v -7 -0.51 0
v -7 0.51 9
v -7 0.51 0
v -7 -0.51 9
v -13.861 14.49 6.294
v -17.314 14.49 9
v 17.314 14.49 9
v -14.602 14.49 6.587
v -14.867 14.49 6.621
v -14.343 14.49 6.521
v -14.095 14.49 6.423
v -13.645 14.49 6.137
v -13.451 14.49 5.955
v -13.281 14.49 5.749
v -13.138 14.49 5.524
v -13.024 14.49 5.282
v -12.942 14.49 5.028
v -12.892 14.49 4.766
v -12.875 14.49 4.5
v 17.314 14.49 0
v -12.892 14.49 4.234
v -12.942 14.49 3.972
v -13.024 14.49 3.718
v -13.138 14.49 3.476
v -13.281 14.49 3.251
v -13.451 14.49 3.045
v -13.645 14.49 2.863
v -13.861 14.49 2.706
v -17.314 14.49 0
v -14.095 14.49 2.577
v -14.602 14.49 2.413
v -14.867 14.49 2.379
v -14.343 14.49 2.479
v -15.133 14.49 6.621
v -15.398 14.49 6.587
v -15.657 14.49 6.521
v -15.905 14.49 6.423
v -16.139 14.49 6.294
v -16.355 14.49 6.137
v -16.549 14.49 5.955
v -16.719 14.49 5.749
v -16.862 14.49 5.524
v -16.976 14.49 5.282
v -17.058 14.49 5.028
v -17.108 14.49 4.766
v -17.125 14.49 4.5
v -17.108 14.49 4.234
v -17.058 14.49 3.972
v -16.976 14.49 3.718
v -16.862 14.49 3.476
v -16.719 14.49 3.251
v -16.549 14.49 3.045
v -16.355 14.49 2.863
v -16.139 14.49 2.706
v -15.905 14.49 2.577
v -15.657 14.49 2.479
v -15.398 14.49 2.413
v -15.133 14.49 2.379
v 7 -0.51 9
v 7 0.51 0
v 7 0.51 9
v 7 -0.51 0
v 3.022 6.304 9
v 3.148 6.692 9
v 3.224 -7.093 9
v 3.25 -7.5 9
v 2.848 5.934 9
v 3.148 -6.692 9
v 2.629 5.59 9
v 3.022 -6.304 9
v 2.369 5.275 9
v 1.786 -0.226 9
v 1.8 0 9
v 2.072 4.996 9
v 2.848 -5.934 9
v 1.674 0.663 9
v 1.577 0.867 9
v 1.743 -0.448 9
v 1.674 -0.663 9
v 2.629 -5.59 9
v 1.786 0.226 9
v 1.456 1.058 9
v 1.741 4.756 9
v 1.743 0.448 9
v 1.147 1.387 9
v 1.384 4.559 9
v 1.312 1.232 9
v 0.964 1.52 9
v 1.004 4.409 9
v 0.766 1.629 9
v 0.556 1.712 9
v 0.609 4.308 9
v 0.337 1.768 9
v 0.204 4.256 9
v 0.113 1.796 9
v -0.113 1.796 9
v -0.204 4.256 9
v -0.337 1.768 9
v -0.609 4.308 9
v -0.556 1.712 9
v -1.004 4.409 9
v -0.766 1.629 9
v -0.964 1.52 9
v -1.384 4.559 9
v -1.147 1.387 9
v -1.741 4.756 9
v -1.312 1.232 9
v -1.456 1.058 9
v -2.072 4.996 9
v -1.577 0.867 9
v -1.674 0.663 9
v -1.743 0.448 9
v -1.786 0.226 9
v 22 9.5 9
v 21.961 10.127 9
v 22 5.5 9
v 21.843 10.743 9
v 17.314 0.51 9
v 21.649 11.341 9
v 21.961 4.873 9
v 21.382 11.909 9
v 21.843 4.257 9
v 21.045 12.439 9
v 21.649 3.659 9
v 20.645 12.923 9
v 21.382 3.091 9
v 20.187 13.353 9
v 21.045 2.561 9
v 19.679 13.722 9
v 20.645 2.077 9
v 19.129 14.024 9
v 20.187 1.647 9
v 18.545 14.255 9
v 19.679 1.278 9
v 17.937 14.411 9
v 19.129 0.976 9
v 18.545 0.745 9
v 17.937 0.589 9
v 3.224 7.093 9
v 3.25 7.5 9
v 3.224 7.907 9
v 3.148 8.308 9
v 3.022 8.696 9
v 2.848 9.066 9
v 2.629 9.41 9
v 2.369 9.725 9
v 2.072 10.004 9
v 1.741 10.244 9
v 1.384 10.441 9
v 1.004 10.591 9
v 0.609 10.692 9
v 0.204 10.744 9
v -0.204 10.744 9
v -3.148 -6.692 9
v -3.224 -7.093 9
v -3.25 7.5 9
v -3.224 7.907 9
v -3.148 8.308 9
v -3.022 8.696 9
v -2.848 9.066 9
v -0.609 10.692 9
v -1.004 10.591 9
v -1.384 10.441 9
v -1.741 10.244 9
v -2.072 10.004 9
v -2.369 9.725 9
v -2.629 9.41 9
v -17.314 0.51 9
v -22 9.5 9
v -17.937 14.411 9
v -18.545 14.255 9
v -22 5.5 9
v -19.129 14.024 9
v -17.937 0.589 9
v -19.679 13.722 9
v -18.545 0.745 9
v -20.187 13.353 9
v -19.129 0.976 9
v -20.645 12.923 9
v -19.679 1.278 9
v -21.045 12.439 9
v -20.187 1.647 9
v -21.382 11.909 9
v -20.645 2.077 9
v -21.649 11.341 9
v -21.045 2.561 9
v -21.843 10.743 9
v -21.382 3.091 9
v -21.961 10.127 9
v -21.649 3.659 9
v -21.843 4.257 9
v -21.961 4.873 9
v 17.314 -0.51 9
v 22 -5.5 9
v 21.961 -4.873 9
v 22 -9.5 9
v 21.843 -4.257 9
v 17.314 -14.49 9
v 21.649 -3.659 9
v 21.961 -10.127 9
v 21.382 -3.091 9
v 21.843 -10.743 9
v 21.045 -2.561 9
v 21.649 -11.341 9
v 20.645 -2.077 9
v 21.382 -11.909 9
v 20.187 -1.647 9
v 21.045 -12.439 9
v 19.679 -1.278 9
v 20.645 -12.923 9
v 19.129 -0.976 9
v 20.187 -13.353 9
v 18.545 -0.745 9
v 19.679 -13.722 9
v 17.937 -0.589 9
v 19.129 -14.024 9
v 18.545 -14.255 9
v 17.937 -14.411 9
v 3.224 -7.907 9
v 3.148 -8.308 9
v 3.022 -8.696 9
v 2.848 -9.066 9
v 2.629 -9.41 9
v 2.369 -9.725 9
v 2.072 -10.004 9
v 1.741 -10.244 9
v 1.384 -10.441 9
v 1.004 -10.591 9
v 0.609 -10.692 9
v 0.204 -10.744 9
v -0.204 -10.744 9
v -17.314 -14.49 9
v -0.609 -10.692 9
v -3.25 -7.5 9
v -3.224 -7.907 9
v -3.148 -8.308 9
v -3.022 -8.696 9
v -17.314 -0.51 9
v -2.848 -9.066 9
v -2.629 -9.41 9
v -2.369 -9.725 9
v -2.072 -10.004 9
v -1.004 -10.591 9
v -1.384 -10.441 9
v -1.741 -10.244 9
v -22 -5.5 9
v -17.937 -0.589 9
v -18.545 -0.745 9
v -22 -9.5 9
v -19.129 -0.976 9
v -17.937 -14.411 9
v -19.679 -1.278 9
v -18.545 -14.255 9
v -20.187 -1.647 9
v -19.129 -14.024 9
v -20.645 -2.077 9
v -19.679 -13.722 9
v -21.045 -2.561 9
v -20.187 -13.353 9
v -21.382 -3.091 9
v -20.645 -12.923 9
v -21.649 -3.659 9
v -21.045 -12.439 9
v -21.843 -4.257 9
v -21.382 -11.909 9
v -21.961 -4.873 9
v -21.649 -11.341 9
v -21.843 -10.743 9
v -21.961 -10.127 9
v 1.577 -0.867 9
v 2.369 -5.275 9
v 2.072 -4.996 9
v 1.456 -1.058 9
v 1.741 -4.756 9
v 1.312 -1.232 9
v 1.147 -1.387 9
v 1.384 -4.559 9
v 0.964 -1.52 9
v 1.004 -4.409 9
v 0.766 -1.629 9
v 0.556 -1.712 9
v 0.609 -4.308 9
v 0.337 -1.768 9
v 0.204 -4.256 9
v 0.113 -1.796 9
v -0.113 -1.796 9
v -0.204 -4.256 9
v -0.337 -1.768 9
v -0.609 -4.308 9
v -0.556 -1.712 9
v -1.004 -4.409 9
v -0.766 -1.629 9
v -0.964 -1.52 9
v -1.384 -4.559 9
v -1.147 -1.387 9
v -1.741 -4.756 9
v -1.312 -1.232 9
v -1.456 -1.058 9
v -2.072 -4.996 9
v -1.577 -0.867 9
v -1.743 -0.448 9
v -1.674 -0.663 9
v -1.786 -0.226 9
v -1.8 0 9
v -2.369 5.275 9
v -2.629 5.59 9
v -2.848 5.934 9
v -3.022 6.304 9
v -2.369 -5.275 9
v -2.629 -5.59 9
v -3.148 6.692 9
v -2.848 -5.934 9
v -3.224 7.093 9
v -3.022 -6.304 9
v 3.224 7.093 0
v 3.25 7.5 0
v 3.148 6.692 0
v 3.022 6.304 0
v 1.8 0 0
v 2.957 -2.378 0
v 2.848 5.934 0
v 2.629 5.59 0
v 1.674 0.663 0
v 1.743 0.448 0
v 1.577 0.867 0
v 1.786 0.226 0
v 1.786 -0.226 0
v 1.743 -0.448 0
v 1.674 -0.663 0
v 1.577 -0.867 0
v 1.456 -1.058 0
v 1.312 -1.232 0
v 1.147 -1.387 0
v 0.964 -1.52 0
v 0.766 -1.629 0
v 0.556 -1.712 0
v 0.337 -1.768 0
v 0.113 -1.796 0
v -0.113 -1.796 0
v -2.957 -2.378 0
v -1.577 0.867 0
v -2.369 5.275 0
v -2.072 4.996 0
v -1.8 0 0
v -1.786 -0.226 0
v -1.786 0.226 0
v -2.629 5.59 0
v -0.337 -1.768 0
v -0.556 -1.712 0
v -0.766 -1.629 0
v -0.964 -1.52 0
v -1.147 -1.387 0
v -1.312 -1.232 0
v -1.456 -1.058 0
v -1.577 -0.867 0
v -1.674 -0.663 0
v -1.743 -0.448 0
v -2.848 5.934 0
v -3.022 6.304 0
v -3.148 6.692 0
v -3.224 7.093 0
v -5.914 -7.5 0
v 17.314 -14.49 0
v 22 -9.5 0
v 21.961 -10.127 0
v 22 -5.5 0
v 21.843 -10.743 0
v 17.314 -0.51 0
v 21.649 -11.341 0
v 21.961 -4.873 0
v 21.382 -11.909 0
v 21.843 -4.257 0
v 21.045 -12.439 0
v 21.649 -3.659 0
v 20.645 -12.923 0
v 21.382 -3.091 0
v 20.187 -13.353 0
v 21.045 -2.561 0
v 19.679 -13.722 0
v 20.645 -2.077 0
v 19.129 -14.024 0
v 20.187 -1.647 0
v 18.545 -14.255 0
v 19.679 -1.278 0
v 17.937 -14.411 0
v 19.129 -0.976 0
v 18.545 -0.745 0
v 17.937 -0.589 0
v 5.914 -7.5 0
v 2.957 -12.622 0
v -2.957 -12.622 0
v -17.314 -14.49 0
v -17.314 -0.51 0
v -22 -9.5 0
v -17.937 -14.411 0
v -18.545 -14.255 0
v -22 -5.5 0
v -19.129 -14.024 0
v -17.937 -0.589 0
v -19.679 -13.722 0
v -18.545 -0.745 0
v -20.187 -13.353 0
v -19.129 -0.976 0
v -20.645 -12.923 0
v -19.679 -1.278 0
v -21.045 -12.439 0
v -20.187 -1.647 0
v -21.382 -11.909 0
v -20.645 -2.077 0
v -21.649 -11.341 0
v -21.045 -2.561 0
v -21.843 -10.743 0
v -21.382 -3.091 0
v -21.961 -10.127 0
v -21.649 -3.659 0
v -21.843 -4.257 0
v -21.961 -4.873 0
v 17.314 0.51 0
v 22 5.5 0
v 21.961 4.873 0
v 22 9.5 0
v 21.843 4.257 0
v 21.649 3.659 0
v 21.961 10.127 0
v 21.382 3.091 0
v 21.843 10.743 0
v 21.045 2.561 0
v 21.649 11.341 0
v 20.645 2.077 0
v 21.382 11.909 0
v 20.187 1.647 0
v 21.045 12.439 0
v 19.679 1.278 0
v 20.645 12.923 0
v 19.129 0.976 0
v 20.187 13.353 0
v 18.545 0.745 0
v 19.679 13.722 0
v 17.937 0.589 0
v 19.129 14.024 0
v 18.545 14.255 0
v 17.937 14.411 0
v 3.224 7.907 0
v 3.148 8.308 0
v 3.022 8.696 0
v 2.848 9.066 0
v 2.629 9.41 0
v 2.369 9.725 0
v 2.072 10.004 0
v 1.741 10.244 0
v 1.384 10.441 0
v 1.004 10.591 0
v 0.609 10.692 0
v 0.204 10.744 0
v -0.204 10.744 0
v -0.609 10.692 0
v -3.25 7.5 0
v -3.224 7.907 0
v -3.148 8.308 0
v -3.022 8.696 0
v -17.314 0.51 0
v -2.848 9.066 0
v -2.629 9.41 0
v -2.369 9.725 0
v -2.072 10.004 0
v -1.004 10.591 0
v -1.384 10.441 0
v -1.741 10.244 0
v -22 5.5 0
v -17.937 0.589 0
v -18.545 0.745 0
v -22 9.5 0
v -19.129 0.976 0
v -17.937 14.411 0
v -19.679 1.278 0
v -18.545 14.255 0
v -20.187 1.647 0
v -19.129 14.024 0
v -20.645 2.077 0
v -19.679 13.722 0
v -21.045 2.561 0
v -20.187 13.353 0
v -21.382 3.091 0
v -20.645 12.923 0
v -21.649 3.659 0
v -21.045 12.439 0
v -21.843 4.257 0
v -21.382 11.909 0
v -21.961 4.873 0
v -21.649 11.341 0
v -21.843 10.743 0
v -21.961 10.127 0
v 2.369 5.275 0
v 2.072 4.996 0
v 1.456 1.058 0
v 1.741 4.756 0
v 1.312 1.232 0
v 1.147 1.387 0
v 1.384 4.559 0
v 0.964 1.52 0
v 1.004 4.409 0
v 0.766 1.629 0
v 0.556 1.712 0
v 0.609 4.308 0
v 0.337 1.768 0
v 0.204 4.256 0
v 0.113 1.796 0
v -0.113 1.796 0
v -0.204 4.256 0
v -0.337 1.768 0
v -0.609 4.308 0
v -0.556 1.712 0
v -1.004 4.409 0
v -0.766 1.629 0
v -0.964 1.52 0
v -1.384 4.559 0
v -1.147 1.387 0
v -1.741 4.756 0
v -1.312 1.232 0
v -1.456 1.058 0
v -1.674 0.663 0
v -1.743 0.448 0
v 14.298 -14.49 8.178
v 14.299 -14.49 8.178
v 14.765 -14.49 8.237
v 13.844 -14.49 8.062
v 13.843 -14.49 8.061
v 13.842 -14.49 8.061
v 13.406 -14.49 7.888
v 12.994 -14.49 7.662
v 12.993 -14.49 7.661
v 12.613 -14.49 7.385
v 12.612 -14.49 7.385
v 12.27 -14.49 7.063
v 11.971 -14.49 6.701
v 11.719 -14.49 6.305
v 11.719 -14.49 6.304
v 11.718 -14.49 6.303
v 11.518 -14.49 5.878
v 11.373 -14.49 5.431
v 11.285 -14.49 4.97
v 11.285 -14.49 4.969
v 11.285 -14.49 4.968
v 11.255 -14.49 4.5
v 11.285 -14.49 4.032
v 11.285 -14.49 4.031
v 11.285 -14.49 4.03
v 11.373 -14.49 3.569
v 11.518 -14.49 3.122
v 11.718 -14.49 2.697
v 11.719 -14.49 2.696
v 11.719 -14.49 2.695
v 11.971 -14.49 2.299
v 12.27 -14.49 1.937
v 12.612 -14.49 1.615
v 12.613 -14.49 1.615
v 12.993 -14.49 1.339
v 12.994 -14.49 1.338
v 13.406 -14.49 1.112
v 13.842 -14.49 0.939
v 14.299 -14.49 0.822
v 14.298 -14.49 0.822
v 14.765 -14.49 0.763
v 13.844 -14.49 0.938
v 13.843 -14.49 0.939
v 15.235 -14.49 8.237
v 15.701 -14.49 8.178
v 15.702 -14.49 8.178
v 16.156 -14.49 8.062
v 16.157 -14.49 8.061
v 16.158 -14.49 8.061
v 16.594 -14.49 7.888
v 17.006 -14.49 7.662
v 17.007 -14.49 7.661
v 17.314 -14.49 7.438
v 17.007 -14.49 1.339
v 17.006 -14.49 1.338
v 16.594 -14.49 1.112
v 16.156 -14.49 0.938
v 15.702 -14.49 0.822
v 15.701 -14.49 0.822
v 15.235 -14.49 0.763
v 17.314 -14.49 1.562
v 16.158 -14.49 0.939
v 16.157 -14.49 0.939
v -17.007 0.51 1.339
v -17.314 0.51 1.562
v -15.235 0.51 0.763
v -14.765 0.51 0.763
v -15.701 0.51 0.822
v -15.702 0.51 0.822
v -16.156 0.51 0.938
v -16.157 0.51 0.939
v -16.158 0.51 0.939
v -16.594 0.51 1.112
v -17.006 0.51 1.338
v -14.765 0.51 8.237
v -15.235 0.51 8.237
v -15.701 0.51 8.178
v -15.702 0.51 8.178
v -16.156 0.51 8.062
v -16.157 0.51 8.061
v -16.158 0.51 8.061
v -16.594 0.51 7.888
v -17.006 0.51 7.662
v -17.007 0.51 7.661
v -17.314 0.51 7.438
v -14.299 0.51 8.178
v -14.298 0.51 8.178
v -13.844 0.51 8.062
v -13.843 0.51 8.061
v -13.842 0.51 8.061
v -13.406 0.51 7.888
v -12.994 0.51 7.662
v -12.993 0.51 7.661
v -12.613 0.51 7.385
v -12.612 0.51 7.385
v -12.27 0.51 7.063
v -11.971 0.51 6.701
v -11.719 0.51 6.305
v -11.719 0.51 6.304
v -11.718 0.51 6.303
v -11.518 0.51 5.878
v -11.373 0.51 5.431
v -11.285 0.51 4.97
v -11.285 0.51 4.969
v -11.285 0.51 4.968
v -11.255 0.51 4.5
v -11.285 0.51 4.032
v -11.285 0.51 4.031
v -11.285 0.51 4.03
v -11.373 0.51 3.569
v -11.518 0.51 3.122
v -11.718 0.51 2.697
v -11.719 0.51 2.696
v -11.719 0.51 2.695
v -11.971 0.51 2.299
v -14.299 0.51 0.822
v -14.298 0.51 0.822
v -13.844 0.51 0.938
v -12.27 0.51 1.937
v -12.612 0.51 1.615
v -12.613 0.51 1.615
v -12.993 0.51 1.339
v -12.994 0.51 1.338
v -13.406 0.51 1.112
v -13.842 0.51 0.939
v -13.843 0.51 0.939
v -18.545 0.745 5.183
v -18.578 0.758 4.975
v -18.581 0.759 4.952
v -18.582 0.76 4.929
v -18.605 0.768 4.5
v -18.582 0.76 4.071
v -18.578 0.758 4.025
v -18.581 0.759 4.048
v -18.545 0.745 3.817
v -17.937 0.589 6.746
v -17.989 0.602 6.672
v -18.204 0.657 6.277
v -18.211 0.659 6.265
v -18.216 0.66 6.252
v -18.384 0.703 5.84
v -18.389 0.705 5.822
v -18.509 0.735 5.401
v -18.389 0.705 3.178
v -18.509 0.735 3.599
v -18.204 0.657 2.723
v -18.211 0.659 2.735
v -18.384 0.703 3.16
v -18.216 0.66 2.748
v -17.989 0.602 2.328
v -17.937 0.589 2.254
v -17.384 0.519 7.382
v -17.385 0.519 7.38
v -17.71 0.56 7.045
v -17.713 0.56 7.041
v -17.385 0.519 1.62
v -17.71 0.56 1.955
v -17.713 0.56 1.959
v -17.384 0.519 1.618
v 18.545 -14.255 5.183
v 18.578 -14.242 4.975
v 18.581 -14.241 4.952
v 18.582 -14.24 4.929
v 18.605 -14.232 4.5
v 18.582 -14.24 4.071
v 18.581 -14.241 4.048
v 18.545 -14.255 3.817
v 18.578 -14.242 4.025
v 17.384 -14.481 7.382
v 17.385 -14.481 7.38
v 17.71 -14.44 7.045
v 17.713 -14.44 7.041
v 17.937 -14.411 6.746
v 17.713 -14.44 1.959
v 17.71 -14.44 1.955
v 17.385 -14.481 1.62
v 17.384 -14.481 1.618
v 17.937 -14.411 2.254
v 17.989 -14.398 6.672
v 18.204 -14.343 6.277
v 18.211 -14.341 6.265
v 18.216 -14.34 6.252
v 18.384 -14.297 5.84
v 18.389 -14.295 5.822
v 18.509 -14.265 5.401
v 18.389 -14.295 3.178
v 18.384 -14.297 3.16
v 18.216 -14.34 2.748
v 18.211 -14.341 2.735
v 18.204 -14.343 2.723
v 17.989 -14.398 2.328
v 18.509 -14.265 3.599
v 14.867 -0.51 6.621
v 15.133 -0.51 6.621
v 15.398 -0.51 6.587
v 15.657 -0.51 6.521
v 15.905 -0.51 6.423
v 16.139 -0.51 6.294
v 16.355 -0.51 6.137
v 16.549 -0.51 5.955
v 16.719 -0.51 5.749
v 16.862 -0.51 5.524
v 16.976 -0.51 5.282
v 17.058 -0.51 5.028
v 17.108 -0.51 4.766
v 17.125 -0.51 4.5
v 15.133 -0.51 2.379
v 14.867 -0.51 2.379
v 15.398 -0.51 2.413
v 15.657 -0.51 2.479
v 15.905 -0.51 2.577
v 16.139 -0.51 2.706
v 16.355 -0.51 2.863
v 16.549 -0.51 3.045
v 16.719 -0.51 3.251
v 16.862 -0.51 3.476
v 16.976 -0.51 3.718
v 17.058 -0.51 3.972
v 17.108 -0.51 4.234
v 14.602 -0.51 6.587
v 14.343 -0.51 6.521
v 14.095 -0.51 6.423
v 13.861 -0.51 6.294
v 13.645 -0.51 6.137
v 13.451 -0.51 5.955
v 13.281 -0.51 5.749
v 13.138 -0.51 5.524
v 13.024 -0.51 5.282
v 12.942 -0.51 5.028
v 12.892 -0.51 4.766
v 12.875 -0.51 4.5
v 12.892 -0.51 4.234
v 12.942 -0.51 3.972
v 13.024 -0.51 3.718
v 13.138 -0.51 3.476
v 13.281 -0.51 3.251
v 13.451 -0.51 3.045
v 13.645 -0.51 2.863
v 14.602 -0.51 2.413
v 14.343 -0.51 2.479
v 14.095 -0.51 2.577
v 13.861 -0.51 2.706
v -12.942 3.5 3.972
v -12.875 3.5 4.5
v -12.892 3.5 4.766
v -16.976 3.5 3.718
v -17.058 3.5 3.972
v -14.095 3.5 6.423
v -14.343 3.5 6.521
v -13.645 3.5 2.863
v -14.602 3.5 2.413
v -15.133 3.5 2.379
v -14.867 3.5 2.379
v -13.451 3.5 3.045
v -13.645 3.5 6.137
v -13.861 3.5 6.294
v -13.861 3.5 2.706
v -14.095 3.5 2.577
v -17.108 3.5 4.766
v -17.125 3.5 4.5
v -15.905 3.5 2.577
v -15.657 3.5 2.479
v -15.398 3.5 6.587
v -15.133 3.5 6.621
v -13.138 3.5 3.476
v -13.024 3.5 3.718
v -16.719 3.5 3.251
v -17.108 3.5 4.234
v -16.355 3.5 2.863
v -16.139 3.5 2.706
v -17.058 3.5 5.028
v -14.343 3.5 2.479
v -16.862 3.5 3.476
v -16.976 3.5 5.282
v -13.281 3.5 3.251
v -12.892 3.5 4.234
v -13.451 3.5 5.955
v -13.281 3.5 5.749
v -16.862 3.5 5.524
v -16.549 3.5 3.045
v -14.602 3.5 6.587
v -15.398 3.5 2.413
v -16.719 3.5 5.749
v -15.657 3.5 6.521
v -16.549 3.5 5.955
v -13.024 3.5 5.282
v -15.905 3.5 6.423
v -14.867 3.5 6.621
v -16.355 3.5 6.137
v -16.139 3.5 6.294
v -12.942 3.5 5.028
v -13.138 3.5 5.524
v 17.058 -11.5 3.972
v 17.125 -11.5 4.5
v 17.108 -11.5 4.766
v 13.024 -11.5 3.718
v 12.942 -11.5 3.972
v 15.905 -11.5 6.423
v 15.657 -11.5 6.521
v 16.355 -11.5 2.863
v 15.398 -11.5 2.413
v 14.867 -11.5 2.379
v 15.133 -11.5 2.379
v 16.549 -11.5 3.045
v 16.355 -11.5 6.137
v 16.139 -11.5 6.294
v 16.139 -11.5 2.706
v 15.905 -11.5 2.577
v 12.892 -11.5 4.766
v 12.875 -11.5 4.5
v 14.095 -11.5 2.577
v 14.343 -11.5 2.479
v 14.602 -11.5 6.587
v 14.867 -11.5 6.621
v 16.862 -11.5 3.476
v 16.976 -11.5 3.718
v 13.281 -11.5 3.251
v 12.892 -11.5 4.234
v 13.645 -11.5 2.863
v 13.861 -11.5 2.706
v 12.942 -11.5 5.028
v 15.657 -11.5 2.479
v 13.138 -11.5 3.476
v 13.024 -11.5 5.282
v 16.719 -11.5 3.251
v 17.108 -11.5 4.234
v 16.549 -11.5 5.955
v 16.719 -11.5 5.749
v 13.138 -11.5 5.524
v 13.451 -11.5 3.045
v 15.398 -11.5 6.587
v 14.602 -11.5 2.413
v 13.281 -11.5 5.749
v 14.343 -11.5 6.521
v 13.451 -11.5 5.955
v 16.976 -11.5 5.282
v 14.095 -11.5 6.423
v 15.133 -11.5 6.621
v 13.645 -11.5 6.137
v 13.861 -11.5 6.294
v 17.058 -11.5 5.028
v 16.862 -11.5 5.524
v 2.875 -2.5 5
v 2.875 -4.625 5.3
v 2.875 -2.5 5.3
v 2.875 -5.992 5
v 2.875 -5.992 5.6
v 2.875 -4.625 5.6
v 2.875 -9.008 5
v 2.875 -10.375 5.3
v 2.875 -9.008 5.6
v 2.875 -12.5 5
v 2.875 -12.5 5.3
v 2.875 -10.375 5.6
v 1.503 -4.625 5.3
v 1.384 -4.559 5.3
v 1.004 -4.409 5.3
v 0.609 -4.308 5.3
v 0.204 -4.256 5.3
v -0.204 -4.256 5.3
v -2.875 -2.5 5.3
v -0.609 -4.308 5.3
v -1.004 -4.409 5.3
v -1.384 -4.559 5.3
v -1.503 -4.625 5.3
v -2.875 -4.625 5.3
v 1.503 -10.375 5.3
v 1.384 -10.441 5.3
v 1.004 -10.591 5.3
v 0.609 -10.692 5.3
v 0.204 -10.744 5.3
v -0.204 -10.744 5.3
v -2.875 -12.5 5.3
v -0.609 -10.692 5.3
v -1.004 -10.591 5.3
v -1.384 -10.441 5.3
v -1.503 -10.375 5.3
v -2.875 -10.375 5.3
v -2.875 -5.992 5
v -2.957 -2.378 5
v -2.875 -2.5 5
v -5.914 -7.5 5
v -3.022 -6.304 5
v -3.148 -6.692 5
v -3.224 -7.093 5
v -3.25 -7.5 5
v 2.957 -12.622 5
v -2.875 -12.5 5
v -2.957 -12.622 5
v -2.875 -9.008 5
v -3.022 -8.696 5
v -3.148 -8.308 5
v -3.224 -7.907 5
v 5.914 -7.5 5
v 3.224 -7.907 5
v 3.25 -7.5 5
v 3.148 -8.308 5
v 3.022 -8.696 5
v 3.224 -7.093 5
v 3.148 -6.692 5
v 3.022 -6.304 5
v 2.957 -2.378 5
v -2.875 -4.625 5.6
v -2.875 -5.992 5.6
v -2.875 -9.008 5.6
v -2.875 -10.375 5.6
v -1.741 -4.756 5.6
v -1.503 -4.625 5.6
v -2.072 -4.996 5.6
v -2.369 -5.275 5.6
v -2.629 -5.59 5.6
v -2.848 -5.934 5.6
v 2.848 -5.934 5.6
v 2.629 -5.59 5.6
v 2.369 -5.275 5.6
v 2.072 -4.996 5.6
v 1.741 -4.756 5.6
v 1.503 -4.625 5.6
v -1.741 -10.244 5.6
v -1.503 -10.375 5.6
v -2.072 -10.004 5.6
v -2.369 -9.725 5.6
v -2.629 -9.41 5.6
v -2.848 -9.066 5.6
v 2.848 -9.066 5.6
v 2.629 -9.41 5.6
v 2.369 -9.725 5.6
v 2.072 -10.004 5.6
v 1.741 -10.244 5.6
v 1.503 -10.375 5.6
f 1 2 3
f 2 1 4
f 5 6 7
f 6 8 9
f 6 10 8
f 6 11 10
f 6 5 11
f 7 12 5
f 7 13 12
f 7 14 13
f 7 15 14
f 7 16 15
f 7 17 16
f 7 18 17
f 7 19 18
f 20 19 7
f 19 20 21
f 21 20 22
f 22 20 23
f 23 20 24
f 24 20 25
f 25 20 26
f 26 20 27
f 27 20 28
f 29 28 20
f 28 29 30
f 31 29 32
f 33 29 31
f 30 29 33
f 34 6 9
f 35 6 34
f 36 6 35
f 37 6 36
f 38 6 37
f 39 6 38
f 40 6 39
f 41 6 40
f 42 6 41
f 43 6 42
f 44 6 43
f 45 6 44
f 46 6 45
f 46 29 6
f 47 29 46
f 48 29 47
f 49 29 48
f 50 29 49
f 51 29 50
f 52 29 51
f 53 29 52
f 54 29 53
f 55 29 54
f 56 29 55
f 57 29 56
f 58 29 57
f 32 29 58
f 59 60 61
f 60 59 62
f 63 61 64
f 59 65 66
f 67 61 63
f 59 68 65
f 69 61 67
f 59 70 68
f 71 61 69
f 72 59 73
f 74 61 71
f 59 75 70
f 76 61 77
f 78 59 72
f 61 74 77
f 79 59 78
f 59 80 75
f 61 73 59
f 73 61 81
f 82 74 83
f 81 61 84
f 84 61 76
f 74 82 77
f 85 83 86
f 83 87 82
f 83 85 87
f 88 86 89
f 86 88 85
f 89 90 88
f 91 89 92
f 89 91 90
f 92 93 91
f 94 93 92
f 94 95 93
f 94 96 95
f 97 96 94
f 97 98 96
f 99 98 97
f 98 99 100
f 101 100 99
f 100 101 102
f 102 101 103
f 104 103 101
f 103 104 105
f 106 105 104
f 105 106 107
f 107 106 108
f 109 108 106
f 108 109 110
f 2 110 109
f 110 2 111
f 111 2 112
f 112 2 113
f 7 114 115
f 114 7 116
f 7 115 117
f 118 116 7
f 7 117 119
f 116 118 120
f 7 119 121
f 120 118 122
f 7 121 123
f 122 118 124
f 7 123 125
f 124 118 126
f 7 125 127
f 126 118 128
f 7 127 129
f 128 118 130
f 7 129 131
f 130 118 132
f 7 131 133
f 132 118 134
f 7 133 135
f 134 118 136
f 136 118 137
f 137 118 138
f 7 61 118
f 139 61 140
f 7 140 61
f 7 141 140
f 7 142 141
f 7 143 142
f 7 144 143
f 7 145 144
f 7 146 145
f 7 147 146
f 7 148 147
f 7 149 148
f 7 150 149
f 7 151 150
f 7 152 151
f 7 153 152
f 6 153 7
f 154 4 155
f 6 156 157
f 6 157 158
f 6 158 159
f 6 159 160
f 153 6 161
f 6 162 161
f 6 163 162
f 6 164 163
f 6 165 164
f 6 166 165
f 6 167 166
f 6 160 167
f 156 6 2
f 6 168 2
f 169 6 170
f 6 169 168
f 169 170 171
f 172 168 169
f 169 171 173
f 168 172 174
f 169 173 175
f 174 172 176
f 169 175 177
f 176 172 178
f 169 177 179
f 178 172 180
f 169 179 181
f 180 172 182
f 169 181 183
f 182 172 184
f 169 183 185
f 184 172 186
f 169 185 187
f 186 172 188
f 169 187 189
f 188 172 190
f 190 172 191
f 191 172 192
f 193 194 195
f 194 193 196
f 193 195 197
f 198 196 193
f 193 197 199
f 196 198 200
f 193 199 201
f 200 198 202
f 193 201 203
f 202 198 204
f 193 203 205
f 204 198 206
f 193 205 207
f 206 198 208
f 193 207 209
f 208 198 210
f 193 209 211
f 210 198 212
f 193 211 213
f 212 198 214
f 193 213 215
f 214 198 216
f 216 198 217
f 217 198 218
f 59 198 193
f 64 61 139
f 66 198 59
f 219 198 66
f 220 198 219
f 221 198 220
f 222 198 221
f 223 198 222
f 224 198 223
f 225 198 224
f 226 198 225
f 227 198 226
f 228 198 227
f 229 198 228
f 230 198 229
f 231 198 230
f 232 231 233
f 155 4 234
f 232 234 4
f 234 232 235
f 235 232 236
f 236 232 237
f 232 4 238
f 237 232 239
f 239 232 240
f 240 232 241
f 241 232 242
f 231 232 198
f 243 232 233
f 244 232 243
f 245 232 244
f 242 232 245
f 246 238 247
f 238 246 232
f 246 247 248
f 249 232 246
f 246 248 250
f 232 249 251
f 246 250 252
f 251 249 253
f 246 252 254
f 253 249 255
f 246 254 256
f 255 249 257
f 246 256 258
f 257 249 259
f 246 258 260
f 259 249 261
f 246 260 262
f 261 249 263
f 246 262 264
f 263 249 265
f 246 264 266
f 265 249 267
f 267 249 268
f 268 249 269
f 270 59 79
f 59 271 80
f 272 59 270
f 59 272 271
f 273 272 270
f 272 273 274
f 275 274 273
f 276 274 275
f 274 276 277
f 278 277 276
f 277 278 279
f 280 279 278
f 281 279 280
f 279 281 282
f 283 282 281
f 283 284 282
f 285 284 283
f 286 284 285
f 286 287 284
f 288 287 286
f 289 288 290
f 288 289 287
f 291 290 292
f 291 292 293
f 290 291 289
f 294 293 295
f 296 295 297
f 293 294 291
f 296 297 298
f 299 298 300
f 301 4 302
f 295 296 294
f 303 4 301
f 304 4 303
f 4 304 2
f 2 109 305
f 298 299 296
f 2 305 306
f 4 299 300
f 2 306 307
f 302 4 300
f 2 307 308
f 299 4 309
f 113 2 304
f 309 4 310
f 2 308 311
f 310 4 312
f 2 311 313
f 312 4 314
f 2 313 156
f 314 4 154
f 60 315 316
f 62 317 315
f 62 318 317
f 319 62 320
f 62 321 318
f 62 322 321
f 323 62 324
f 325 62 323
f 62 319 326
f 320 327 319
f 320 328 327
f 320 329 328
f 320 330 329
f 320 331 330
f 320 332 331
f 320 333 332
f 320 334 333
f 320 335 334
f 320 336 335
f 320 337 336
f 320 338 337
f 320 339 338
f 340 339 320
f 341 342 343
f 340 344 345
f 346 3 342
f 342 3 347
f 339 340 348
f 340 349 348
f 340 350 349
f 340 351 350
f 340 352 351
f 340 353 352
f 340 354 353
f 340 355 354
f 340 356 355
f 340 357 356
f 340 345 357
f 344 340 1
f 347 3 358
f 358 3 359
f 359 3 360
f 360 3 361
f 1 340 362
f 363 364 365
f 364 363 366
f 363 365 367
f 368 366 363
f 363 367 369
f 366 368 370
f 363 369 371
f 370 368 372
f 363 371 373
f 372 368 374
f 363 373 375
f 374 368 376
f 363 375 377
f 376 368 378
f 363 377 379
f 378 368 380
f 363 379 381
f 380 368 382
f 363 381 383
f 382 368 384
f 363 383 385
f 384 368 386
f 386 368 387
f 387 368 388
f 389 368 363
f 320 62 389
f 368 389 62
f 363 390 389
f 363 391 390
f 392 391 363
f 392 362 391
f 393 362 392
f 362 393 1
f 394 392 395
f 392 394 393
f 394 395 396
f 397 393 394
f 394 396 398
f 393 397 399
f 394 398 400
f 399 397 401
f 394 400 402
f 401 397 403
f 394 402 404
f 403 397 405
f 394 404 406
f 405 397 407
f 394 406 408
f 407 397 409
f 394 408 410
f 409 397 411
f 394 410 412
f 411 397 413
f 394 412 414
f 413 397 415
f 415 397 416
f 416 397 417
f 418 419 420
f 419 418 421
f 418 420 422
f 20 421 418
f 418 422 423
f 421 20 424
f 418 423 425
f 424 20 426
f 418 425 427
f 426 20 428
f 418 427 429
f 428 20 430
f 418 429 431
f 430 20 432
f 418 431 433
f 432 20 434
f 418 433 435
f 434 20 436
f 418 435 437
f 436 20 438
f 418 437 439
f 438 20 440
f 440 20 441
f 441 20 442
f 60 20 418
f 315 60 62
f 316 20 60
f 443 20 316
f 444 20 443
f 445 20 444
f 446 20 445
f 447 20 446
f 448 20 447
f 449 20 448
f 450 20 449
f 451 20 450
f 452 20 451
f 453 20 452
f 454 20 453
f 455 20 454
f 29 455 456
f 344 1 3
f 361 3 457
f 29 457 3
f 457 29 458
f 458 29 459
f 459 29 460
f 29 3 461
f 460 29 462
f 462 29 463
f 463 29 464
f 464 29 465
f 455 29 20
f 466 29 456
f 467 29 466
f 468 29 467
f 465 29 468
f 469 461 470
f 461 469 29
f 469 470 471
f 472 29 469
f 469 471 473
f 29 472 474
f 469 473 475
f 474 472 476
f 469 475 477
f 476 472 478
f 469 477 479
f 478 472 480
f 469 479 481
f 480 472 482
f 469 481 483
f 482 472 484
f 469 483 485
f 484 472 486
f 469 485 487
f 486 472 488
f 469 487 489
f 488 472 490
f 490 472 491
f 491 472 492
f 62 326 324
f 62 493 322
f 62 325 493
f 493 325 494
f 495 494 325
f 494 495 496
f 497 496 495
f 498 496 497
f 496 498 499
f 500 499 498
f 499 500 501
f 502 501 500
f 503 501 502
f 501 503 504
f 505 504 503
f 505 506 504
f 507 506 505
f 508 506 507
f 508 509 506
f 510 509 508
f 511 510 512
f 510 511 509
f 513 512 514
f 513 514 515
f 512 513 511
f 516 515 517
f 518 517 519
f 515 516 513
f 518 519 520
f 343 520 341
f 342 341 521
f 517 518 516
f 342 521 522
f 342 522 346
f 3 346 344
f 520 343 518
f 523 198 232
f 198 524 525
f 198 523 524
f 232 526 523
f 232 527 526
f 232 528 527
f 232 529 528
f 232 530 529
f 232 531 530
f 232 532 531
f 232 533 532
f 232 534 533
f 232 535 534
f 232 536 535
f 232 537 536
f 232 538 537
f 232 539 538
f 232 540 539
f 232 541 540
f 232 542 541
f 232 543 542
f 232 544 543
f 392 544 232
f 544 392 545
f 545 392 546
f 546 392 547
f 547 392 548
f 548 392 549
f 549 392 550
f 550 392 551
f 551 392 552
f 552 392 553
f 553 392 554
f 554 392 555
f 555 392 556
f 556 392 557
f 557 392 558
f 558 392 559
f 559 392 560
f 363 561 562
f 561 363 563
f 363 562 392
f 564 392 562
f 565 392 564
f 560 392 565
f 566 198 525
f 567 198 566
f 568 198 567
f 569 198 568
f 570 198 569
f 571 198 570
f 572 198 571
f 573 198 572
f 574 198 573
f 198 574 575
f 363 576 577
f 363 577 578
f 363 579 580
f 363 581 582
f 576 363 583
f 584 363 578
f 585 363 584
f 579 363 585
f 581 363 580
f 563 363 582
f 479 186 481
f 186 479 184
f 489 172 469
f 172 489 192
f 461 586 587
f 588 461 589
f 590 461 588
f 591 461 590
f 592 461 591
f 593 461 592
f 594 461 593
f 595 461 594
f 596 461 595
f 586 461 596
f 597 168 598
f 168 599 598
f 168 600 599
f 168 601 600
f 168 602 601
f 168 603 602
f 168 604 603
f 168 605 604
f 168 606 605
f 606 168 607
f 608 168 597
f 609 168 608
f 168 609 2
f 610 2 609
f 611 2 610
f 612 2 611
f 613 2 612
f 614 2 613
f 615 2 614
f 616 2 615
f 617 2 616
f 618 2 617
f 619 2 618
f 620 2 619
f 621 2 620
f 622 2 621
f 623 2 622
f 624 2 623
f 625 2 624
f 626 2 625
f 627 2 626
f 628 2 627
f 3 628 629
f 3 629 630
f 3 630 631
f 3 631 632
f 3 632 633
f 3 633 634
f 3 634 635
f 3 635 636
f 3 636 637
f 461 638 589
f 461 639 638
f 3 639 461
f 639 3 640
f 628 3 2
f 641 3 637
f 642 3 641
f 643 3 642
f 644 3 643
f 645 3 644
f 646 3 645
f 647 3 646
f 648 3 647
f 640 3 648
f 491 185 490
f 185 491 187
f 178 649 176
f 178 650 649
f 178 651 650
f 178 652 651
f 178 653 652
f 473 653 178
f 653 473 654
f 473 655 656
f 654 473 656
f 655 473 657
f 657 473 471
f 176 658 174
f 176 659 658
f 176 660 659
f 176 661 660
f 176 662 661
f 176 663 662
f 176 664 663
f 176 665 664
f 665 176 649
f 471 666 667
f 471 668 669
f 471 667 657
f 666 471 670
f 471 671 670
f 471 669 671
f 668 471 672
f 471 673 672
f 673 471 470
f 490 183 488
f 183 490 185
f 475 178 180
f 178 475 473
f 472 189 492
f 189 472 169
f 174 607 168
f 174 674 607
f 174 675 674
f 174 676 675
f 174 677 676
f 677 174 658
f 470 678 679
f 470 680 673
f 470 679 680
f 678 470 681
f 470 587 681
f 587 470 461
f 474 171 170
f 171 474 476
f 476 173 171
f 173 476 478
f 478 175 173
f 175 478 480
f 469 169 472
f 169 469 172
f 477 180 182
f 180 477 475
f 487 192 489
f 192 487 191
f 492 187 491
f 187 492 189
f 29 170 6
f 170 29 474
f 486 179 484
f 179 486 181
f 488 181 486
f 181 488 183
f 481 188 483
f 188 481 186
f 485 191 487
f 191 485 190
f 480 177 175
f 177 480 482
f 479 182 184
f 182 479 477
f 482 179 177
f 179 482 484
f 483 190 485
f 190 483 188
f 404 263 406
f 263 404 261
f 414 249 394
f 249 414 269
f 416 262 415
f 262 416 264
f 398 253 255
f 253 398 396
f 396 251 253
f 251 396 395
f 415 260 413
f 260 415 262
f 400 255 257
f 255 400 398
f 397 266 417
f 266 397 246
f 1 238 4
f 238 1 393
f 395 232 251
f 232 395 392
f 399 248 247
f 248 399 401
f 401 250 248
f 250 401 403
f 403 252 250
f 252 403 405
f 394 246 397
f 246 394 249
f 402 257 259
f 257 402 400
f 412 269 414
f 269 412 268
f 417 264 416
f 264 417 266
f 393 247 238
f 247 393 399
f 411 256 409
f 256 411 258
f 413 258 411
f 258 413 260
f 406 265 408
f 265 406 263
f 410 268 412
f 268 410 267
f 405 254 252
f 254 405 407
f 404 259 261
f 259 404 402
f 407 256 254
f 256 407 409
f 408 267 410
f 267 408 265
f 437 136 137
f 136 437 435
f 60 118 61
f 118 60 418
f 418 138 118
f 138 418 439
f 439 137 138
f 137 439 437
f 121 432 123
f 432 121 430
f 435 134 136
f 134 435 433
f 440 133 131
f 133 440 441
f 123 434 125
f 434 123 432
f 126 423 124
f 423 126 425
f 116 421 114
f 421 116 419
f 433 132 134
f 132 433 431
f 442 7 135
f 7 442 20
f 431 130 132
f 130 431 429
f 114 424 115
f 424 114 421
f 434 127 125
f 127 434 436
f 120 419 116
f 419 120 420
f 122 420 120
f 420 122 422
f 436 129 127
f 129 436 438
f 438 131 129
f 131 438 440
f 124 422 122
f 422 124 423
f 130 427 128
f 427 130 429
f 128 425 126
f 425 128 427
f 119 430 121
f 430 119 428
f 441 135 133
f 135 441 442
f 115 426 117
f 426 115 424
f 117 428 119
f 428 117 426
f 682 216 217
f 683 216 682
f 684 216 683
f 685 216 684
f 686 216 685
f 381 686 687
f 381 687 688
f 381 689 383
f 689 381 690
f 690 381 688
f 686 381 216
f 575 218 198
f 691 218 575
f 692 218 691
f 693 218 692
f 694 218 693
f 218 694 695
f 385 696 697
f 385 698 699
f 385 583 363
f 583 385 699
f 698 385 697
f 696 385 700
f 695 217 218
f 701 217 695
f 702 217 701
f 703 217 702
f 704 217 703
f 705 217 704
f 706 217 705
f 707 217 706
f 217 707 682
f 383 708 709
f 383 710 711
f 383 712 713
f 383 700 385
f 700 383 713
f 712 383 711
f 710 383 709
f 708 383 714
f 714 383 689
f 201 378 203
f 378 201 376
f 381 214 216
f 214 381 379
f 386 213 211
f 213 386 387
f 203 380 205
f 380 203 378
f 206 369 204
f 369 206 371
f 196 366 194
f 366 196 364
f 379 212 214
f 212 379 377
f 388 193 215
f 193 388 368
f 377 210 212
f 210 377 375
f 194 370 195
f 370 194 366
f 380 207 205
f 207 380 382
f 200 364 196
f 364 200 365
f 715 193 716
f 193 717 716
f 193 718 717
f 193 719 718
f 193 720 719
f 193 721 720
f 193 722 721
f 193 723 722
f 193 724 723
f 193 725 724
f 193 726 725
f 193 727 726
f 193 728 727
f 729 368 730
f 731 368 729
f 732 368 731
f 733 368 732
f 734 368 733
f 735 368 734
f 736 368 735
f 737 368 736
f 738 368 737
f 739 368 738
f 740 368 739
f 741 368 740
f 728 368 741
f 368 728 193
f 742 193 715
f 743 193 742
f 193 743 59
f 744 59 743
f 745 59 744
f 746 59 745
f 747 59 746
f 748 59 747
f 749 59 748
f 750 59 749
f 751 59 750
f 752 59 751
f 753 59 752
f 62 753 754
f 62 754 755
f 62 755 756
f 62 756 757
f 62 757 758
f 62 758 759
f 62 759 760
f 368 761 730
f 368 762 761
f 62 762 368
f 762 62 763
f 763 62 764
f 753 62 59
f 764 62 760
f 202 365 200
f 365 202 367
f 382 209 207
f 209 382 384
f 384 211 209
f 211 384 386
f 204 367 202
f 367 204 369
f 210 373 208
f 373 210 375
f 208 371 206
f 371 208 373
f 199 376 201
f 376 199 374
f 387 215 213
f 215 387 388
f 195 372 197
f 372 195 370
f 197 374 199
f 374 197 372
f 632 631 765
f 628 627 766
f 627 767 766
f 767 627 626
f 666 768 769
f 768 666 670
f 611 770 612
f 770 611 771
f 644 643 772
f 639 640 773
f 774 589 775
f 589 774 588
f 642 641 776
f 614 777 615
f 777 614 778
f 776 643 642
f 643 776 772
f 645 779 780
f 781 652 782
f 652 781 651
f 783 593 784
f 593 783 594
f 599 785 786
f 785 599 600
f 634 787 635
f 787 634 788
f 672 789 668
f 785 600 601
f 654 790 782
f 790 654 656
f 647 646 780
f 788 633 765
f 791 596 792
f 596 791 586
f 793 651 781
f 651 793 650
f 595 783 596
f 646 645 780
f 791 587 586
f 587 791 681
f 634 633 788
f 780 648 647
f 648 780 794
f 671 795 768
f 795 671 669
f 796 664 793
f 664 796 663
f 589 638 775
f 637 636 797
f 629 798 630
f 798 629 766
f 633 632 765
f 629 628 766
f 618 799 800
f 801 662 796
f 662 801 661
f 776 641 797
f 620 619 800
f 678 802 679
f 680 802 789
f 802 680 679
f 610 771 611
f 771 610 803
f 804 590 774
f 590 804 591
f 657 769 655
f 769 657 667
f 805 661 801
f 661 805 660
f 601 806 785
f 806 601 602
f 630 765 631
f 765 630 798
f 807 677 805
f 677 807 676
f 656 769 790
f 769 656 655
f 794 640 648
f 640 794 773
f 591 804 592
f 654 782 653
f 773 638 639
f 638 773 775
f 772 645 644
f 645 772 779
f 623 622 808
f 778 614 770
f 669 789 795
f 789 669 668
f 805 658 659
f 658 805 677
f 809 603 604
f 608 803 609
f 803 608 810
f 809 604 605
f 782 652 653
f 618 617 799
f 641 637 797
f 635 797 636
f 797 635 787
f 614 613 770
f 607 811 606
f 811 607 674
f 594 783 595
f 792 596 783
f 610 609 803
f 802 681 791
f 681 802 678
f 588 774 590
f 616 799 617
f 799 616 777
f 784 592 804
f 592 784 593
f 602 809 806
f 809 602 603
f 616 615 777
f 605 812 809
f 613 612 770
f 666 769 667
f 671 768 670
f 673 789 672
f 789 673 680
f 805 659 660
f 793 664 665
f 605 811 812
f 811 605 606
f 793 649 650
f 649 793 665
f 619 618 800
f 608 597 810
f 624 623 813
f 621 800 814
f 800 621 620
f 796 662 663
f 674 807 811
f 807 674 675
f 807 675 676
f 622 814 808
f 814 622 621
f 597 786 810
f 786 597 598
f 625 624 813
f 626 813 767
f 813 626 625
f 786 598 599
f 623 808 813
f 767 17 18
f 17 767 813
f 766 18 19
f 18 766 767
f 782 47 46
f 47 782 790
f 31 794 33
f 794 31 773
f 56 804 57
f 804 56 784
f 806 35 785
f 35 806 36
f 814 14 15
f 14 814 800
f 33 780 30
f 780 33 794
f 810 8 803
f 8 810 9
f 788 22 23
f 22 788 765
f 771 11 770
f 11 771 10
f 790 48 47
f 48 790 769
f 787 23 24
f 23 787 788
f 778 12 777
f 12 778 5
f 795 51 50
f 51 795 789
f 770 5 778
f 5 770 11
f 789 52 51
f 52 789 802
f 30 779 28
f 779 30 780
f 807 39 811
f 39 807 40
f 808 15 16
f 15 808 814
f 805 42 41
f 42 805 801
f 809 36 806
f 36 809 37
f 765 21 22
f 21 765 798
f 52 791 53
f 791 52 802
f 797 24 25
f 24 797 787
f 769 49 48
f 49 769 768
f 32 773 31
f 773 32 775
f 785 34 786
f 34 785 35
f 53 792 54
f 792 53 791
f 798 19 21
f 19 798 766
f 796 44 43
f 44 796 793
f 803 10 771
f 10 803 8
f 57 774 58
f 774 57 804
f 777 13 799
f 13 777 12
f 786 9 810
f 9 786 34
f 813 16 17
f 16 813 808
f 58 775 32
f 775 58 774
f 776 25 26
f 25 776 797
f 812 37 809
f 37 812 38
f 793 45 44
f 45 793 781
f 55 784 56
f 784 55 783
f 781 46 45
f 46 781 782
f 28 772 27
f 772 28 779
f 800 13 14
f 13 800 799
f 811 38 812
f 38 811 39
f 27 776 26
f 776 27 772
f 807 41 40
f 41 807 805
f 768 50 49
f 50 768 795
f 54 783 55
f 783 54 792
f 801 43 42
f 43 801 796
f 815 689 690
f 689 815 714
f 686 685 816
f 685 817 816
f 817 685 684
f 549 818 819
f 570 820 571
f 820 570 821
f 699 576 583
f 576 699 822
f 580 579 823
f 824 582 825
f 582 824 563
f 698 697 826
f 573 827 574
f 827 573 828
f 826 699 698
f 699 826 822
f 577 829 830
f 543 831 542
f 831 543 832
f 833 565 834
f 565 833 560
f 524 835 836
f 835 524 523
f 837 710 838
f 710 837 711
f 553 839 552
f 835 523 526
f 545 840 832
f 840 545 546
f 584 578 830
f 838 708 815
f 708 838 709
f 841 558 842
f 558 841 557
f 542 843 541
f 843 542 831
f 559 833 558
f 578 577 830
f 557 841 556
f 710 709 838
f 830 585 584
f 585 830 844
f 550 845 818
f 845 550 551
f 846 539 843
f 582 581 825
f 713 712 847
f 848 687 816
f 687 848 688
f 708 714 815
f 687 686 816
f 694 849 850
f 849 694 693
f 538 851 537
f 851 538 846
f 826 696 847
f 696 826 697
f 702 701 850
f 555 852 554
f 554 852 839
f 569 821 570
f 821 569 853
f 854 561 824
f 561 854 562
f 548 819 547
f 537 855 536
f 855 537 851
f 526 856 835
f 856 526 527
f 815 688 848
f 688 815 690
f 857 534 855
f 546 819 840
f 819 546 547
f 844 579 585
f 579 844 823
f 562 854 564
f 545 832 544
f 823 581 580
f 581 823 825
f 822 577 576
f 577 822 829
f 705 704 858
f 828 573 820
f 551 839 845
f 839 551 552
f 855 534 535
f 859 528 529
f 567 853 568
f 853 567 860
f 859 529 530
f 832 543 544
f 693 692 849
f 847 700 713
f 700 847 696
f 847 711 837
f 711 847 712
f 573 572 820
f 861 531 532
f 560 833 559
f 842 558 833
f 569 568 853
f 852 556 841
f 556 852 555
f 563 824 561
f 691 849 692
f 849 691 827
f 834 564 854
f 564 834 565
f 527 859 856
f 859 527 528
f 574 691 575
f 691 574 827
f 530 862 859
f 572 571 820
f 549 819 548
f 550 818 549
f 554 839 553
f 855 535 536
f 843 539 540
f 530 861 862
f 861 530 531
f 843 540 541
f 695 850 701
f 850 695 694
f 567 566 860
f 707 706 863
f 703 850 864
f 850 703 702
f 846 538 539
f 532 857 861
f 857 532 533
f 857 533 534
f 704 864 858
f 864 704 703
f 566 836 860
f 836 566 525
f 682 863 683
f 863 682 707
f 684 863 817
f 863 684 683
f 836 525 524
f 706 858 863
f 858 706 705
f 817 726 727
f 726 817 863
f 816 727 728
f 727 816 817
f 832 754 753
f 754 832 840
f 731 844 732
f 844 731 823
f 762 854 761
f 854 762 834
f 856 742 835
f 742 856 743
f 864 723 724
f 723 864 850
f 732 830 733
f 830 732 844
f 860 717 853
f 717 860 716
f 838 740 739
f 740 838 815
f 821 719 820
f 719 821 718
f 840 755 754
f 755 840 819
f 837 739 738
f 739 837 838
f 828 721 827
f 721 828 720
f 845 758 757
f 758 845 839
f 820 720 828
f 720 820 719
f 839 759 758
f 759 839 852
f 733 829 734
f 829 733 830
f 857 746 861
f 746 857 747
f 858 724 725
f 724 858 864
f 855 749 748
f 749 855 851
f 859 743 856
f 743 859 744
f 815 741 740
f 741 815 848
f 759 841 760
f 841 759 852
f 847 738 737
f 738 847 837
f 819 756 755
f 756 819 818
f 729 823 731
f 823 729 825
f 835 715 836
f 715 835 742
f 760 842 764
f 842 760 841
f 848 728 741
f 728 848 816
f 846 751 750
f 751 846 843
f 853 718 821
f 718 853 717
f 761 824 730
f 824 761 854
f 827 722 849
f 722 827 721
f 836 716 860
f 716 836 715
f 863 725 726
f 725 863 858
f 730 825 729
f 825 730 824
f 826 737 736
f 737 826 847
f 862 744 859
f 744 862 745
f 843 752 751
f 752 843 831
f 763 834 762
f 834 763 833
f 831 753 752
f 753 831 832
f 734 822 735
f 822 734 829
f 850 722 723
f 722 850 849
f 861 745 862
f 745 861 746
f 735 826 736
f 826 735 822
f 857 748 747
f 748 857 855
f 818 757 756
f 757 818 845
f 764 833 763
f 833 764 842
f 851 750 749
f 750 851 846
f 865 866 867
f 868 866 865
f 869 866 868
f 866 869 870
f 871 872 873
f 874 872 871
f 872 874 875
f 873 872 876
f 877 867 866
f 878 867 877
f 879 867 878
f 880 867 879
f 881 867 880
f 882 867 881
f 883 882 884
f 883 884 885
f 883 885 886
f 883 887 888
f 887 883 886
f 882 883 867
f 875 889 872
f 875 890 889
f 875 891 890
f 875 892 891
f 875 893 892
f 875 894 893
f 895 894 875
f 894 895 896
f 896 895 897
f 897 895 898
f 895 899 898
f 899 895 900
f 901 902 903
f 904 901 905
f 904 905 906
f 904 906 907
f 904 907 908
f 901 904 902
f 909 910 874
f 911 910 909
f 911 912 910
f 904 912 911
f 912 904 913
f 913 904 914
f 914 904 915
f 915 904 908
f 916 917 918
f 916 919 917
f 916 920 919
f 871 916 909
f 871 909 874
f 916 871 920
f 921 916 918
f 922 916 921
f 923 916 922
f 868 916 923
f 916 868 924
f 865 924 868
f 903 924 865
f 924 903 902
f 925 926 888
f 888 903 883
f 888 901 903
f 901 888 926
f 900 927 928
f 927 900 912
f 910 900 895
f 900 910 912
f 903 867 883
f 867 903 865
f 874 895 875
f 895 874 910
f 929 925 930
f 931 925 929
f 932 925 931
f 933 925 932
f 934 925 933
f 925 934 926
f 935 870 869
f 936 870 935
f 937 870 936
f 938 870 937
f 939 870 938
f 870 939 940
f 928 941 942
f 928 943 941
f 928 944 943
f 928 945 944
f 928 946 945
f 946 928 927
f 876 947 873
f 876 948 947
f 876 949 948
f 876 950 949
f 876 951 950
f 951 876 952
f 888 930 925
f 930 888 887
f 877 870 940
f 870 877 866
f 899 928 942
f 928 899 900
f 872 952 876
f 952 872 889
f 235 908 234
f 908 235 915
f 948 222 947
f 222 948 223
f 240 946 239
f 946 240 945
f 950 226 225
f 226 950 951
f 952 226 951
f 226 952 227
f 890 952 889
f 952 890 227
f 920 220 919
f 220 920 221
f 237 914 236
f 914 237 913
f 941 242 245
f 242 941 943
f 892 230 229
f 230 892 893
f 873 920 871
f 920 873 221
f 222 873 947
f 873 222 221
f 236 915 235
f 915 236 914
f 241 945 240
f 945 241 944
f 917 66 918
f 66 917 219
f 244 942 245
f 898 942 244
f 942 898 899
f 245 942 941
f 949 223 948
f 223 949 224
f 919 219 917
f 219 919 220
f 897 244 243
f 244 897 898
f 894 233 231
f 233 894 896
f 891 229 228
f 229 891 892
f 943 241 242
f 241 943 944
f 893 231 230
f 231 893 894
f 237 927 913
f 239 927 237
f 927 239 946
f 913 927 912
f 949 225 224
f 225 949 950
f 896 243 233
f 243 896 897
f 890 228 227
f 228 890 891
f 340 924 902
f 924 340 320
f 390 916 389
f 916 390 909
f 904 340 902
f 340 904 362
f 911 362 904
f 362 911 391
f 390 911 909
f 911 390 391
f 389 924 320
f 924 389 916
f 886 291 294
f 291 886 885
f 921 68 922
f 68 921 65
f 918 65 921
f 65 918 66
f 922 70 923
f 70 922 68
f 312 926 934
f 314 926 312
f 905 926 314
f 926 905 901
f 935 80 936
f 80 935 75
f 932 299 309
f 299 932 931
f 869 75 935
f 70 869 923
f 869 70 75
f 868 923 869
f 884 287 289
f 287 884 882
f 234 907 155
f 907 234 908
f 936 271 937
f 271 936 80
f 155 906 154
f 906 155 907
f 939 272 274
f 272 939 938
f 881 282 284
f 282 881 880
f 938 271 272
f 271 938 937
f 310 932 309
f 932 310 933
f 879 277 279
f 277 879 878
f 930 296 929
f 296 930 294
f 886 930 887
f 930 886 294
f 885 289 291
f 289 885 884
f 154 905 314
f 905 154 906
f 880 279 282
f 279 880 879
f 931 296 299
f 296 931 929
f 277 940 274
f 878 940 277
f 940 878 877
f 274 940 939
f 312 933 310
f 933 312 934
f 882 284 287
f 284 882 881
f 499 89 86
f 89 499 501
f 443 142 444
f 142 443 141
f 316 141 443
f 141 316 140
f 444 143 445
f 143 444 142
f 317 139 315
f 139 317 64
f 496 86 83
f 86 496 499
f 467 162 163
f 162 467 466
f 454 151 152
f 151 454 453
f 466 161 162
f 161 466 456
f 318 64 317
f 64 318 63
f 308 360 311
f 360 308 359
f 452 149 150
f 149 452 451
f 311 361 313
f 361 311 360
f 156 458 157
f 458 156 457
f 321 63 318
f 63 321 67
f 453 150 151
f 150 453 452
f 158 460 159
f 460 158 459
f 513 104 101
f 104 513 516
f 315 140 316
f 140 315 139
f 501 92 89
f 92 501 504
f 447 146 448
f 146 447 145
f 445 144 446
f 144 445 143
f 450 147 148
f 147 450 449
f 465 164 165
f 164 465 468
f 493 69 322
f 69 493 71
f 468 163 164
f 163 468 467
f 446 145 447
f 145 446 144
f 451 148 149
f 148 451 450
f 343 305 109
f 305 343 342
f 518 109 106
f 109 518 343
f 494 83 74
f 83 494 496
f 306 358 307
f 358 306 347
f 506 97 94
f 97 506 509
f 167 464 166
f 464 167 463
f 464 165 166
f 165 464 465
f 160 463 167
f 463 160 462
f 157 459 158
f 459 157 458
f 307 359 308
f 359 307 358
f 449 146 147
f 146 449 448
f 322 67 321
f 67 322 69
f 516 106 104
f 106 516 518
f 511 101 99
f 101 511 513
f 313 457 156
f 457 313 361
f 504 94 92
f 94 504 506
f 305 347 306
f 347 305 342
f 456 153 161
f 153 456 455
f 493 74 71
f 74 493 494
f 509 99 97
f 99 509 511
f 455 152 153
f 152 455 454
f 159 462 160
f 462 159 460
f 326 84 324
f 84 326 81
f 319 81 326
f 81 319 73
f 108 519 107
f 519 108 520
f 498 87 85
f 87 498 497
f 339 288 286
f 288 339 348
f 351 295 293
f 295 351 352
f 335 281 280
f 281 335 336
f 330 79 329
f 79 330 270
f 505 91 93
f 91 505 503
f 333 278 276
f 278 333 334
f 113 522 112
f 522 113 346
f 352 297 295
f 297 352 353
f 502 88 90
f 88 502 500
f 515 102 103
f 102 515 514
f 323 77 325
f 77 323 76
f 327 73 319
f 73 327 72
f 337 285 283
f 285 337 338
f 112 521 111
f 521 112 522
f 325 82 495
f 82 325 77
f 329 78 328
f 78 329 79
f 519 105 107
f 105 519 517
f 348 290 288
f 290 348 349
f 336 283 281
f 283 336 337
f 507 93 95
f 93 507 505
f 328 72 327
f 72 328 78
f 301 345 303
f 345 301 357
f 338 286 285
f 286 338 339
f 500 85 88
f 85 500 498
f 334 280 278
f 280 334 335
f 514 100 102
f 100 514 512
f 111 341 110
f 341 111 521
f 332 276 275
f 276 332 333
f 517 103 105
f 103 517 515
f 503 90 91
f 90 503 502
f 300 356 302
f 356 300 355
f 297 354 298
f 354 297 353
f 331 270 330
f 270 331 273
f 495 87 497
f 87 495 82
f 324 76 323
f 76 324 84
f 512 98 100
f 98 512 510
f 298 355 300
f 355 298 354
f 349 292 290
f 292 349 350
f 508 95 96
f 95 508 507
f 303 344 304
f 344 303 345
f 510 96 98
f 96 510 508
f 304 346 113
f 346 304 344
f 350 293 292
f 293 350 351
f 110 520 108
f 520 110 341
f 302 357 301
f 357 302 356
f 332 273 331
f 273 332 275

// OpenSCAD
$fn = 50;


difference() {
	union() {
		hull() {
			translate(v = [-2.0000000000, 9.5000000000, 0]) {
				cylinder(h = 9, r = 5);
			}
			translate(v = [2.0000000000, 9.5000000000, 0]) {
				cylinder(h = 9, r = 5);
			}
			translate(v = [-2.0000000000, -9.5000000000, 0]) {
				cylinder(h = 9, r = 5);
			}
			translate(v = [2.0000000000, -9.5000000000, 0]) {
				cylinder(h = 9, r = 5);
			}
		}
		translate(v = [-7.5000000000, 7.5000000000, 0]) {
			hull() {
				translate(v = [-9.5000000000, 2.0000000000, 0]) {
					cylinder(h = 9, r = 5);
				}
				translate(v = [9.5000000000, 2.0000000000, 0]) {
					cylinder(h = 9, r = 5);
				}
				translate(v = [-9.5000000000, -2.0000000000, 0]) {
					cylinder(h = 9, r = 5);
				}
				translate(v = [9.5000000000, -2.0000000000, 0]) {
					cylinder(h = 9, r = 5);
				}
			}
		}
		translate(v = [-7.5000000000, -7.5000000000, 0]) {
			hull() {
				translate(v = [-9.5000000000, 2.0000000000, 0]) {
					cylinder(h = 9, r = 5);
				}
				translate(v = [9.5000000000, 2.0000000000, 0]) {
					cylinder(h = 9, r = 5);
				}
				translate(v = [-9.5000000000, -2.0000000000, 0]) {
					cylinder(h = 9, r = 5);
				}
				translate(v = [9.5000000000, -2.0000000000, 0]) {
					cylinder(h = 9, r = 5);
				}
			}
		}
		translate(v = [7.5000000000, 7.5000000000, 0]) {
			hull() {
				translate(v = [-9.5000000000, 2.0000000000, 0]) {
					cylinder(h = 9, r = 5);
				}
				translate(v = [9.5000000000, 2.0000000000, 0]) {
					cylinder(h = 9, r = 5);
				}
				translate(v = [-9.5000000000, -2.0000000000, 0]) {
					cylinder(h = 9, r = 5);
				}
				translate(v = [9.5000000000, -2.0000000000, 0]) {
					cylinder(h = 9, r = 5);
				}
			}
		}
		translate(v = [7.5000000000, -7.5000000000, 0]) {
			hull() {
				translate(v = [-9.5000000000, 2.0000000000, 0]) {
					cylinder(h = 9, r = 5);
				}
				translate(v = [9.5000000000, 2.0000000000, 0]) {
					cylinder(h = 9, r = 5);
				}
				translate(v = [-9.5000000000, -2.0000000000, 0]) {
					cylinder(h = 9, r = 5);
				}
				translate(v = [9.5000000000, -2.0000000000, 0]) {
					cylinder(h = 9, r = 5);
				}
			}
		}
	}
	union() {
		translate(v = [-15.0000000000, 0.5000000000, 4.5000000000]) {
			rotate(a = [90, 0, 0]) {
				difference() {
					union() {
						#translate(v = [0, 0, -14.0000000000]) {
							cylinder(h = 14, r = 2.0000000000);
						}
						#translate(v = [0, 0, -3]) {
							cylinder(h = 3, r1 = 2.1250000000, r2 = 3.7500000000);
						}
						#translate(v = [0, 0, -14.0000000000]) {
							cylinder(h = 14, r = 2.1250000000);
						}
						#translate(v = [0, 0, -14.0000000000]) {
							cylinder(h = 14, r = 2.0000000000);
						}
					}
					union();
				}
			}
		}
		translate(v = [15.0000000000, -14.5000000000, 4.5000000000]) {
			rotate(a = [90, 0, 0]) {
				difference() {
					union() {
						#translate(v = [0, 0, -14.0000000000]) {
							cylinder(h = 14, r = 2.0000000000);
						}
						#translate(v = [0, 0, -3]) {
							cylinder(h = 3, r1 = 2.1250000000, r2 = 3.7500000000);
						}
						#translate(v = [0, 0, -14.0000000000]) {
							cylinder(h = 14, r = 2.1250000000);
						}
						#translate(v = [0, 0, -14.0000000000]) {
							cylinder(h = 14, r = 2.0000000000);
						}
					}
					union();
				}
			}
		}
		translate(v = [0.0000000000, -7.5000000000, 0]) {
			rotate(a = [0, 0, 0]) {
				difference() {
					union() {
						#translate(v = [-2.8750000000, -5.0000000000, -0.3000000000]) {
							cube(size = [5.7500000000, 10, 0.3000000000]);
						}
						#translate(v = [-2.8750000000, -2.8750000000, -0.6000000000]) {
							cube(size = [5.7500000000, 5.7500000000, 0.3000000000]);
						}
						#translate(v = [-2.8750000000, -5.0000000000, 5]) {
							cube(size = [5.7500000000, 10, 0.3000000000]);
						}
						#translate(v = [-2.8750000000, -2.8750000000, 5.3000000000]) {
							cube(size = [5.7500000000, 5.7500000000, 0.3000000000]);
						}
						#translate(v = [0, 0, -100.0000000000]) {
							cylinder(h = 200, r = 3.2500000000);
						}
						#linear_extrude(height = 5) {
							polygon(points = [[5.9142500000, 0.0000000000], [2.9571250000, 5.1218907443], [-2.9571250000, 5.1218907443], [-5.9142500000, 0.0000000000], [-2.9571250000, -5.1218907443], [2.9571250000, -5.1218907443]]);
						}
						#translate(v = [-2.8750000000, -5.0000000000, -0.3000000000]) {
							cube(size = [5.7500000000, 10, 0.3000000000]);
						}
						#translate(v = [-2.8750000000, -2.8750000000, -0.6000000000]) {
							cube(size = [5.7500000000, 5.7500000000, 0.3000000000]);
						}
						#translate(v = [-2.8750000000, -5.0000000000, 5]) {
							cube(size = [5.7500000000, 10, 0.3000000000]);
						}
						#translate(v = [-2.8750000000, -2.8750000000, 5.3000000000]) {
							cube(size = [5.7500000000, 5.7500000000, 0.3000000000]);
						}
						#translate(v = [0, 0, -100.0000000000]) {
							cylinder(h = 200, r = 3.2500000000);
						}
						#translate(v = [-2.8750000000, -5.0000000000, -0.3000000000]) {
							cube(size = [5.7500000000, 10, 0.3000000000]);
						}
						#translate(v = [-2.8750000000, -2.8750000000, -0.6000000000]) {
							cube(size = [5.7500000000, 5.7500000000, 0.3000000000]);
						}
						#translate(v = [-2.8750000000, -5.0000000000, 5]) {
							cube(size = [5.7500000000, 10, 0.3000000000]);
						}
						#translate(v = [-2.8750000000, -2.8750000000, 5.3000000000]) {
							cube(size = [5.7500000000, 5.7500000000, 0.3000000000]);
						}
						#translate(v = [0, 0, -100.0000000000]) {
							cylinder(h = 200, r = 3.2500000000);
						}
					}
					union();
				}
			}
		}
		translate(v = [0.0000000000, -7.5000000000, 0]) {
			translate(v = [0, 0, -100]) {
				cylinder(h = 200, r = 3.2500000000);
			}
		}
		translate(v = [0.0000000000, 7.5000000000, 0]) {
			translate(v = [0, 0, -100]) {
				cylinder(h = 200, r = 3.2500000000);
			}
		}
		translate(v = [0.0000000000, -7.5000000000, 0]) {
			translate(v = [0, 0, -100]) {
				cylinder(h = 200, r = 1.8000000000);
			}
		}
		translate(v = [0, 0, -100]) {
			cylinder(h = 200, r = 1.8000000000);
		}
		translate(v = [0.0000000000, 7.5000000000, 0]) {
			translate(v = [0, 0, -100]) {
				cylinder(h = 200, r = 1.8000000000);
			}
		}
	}
}
